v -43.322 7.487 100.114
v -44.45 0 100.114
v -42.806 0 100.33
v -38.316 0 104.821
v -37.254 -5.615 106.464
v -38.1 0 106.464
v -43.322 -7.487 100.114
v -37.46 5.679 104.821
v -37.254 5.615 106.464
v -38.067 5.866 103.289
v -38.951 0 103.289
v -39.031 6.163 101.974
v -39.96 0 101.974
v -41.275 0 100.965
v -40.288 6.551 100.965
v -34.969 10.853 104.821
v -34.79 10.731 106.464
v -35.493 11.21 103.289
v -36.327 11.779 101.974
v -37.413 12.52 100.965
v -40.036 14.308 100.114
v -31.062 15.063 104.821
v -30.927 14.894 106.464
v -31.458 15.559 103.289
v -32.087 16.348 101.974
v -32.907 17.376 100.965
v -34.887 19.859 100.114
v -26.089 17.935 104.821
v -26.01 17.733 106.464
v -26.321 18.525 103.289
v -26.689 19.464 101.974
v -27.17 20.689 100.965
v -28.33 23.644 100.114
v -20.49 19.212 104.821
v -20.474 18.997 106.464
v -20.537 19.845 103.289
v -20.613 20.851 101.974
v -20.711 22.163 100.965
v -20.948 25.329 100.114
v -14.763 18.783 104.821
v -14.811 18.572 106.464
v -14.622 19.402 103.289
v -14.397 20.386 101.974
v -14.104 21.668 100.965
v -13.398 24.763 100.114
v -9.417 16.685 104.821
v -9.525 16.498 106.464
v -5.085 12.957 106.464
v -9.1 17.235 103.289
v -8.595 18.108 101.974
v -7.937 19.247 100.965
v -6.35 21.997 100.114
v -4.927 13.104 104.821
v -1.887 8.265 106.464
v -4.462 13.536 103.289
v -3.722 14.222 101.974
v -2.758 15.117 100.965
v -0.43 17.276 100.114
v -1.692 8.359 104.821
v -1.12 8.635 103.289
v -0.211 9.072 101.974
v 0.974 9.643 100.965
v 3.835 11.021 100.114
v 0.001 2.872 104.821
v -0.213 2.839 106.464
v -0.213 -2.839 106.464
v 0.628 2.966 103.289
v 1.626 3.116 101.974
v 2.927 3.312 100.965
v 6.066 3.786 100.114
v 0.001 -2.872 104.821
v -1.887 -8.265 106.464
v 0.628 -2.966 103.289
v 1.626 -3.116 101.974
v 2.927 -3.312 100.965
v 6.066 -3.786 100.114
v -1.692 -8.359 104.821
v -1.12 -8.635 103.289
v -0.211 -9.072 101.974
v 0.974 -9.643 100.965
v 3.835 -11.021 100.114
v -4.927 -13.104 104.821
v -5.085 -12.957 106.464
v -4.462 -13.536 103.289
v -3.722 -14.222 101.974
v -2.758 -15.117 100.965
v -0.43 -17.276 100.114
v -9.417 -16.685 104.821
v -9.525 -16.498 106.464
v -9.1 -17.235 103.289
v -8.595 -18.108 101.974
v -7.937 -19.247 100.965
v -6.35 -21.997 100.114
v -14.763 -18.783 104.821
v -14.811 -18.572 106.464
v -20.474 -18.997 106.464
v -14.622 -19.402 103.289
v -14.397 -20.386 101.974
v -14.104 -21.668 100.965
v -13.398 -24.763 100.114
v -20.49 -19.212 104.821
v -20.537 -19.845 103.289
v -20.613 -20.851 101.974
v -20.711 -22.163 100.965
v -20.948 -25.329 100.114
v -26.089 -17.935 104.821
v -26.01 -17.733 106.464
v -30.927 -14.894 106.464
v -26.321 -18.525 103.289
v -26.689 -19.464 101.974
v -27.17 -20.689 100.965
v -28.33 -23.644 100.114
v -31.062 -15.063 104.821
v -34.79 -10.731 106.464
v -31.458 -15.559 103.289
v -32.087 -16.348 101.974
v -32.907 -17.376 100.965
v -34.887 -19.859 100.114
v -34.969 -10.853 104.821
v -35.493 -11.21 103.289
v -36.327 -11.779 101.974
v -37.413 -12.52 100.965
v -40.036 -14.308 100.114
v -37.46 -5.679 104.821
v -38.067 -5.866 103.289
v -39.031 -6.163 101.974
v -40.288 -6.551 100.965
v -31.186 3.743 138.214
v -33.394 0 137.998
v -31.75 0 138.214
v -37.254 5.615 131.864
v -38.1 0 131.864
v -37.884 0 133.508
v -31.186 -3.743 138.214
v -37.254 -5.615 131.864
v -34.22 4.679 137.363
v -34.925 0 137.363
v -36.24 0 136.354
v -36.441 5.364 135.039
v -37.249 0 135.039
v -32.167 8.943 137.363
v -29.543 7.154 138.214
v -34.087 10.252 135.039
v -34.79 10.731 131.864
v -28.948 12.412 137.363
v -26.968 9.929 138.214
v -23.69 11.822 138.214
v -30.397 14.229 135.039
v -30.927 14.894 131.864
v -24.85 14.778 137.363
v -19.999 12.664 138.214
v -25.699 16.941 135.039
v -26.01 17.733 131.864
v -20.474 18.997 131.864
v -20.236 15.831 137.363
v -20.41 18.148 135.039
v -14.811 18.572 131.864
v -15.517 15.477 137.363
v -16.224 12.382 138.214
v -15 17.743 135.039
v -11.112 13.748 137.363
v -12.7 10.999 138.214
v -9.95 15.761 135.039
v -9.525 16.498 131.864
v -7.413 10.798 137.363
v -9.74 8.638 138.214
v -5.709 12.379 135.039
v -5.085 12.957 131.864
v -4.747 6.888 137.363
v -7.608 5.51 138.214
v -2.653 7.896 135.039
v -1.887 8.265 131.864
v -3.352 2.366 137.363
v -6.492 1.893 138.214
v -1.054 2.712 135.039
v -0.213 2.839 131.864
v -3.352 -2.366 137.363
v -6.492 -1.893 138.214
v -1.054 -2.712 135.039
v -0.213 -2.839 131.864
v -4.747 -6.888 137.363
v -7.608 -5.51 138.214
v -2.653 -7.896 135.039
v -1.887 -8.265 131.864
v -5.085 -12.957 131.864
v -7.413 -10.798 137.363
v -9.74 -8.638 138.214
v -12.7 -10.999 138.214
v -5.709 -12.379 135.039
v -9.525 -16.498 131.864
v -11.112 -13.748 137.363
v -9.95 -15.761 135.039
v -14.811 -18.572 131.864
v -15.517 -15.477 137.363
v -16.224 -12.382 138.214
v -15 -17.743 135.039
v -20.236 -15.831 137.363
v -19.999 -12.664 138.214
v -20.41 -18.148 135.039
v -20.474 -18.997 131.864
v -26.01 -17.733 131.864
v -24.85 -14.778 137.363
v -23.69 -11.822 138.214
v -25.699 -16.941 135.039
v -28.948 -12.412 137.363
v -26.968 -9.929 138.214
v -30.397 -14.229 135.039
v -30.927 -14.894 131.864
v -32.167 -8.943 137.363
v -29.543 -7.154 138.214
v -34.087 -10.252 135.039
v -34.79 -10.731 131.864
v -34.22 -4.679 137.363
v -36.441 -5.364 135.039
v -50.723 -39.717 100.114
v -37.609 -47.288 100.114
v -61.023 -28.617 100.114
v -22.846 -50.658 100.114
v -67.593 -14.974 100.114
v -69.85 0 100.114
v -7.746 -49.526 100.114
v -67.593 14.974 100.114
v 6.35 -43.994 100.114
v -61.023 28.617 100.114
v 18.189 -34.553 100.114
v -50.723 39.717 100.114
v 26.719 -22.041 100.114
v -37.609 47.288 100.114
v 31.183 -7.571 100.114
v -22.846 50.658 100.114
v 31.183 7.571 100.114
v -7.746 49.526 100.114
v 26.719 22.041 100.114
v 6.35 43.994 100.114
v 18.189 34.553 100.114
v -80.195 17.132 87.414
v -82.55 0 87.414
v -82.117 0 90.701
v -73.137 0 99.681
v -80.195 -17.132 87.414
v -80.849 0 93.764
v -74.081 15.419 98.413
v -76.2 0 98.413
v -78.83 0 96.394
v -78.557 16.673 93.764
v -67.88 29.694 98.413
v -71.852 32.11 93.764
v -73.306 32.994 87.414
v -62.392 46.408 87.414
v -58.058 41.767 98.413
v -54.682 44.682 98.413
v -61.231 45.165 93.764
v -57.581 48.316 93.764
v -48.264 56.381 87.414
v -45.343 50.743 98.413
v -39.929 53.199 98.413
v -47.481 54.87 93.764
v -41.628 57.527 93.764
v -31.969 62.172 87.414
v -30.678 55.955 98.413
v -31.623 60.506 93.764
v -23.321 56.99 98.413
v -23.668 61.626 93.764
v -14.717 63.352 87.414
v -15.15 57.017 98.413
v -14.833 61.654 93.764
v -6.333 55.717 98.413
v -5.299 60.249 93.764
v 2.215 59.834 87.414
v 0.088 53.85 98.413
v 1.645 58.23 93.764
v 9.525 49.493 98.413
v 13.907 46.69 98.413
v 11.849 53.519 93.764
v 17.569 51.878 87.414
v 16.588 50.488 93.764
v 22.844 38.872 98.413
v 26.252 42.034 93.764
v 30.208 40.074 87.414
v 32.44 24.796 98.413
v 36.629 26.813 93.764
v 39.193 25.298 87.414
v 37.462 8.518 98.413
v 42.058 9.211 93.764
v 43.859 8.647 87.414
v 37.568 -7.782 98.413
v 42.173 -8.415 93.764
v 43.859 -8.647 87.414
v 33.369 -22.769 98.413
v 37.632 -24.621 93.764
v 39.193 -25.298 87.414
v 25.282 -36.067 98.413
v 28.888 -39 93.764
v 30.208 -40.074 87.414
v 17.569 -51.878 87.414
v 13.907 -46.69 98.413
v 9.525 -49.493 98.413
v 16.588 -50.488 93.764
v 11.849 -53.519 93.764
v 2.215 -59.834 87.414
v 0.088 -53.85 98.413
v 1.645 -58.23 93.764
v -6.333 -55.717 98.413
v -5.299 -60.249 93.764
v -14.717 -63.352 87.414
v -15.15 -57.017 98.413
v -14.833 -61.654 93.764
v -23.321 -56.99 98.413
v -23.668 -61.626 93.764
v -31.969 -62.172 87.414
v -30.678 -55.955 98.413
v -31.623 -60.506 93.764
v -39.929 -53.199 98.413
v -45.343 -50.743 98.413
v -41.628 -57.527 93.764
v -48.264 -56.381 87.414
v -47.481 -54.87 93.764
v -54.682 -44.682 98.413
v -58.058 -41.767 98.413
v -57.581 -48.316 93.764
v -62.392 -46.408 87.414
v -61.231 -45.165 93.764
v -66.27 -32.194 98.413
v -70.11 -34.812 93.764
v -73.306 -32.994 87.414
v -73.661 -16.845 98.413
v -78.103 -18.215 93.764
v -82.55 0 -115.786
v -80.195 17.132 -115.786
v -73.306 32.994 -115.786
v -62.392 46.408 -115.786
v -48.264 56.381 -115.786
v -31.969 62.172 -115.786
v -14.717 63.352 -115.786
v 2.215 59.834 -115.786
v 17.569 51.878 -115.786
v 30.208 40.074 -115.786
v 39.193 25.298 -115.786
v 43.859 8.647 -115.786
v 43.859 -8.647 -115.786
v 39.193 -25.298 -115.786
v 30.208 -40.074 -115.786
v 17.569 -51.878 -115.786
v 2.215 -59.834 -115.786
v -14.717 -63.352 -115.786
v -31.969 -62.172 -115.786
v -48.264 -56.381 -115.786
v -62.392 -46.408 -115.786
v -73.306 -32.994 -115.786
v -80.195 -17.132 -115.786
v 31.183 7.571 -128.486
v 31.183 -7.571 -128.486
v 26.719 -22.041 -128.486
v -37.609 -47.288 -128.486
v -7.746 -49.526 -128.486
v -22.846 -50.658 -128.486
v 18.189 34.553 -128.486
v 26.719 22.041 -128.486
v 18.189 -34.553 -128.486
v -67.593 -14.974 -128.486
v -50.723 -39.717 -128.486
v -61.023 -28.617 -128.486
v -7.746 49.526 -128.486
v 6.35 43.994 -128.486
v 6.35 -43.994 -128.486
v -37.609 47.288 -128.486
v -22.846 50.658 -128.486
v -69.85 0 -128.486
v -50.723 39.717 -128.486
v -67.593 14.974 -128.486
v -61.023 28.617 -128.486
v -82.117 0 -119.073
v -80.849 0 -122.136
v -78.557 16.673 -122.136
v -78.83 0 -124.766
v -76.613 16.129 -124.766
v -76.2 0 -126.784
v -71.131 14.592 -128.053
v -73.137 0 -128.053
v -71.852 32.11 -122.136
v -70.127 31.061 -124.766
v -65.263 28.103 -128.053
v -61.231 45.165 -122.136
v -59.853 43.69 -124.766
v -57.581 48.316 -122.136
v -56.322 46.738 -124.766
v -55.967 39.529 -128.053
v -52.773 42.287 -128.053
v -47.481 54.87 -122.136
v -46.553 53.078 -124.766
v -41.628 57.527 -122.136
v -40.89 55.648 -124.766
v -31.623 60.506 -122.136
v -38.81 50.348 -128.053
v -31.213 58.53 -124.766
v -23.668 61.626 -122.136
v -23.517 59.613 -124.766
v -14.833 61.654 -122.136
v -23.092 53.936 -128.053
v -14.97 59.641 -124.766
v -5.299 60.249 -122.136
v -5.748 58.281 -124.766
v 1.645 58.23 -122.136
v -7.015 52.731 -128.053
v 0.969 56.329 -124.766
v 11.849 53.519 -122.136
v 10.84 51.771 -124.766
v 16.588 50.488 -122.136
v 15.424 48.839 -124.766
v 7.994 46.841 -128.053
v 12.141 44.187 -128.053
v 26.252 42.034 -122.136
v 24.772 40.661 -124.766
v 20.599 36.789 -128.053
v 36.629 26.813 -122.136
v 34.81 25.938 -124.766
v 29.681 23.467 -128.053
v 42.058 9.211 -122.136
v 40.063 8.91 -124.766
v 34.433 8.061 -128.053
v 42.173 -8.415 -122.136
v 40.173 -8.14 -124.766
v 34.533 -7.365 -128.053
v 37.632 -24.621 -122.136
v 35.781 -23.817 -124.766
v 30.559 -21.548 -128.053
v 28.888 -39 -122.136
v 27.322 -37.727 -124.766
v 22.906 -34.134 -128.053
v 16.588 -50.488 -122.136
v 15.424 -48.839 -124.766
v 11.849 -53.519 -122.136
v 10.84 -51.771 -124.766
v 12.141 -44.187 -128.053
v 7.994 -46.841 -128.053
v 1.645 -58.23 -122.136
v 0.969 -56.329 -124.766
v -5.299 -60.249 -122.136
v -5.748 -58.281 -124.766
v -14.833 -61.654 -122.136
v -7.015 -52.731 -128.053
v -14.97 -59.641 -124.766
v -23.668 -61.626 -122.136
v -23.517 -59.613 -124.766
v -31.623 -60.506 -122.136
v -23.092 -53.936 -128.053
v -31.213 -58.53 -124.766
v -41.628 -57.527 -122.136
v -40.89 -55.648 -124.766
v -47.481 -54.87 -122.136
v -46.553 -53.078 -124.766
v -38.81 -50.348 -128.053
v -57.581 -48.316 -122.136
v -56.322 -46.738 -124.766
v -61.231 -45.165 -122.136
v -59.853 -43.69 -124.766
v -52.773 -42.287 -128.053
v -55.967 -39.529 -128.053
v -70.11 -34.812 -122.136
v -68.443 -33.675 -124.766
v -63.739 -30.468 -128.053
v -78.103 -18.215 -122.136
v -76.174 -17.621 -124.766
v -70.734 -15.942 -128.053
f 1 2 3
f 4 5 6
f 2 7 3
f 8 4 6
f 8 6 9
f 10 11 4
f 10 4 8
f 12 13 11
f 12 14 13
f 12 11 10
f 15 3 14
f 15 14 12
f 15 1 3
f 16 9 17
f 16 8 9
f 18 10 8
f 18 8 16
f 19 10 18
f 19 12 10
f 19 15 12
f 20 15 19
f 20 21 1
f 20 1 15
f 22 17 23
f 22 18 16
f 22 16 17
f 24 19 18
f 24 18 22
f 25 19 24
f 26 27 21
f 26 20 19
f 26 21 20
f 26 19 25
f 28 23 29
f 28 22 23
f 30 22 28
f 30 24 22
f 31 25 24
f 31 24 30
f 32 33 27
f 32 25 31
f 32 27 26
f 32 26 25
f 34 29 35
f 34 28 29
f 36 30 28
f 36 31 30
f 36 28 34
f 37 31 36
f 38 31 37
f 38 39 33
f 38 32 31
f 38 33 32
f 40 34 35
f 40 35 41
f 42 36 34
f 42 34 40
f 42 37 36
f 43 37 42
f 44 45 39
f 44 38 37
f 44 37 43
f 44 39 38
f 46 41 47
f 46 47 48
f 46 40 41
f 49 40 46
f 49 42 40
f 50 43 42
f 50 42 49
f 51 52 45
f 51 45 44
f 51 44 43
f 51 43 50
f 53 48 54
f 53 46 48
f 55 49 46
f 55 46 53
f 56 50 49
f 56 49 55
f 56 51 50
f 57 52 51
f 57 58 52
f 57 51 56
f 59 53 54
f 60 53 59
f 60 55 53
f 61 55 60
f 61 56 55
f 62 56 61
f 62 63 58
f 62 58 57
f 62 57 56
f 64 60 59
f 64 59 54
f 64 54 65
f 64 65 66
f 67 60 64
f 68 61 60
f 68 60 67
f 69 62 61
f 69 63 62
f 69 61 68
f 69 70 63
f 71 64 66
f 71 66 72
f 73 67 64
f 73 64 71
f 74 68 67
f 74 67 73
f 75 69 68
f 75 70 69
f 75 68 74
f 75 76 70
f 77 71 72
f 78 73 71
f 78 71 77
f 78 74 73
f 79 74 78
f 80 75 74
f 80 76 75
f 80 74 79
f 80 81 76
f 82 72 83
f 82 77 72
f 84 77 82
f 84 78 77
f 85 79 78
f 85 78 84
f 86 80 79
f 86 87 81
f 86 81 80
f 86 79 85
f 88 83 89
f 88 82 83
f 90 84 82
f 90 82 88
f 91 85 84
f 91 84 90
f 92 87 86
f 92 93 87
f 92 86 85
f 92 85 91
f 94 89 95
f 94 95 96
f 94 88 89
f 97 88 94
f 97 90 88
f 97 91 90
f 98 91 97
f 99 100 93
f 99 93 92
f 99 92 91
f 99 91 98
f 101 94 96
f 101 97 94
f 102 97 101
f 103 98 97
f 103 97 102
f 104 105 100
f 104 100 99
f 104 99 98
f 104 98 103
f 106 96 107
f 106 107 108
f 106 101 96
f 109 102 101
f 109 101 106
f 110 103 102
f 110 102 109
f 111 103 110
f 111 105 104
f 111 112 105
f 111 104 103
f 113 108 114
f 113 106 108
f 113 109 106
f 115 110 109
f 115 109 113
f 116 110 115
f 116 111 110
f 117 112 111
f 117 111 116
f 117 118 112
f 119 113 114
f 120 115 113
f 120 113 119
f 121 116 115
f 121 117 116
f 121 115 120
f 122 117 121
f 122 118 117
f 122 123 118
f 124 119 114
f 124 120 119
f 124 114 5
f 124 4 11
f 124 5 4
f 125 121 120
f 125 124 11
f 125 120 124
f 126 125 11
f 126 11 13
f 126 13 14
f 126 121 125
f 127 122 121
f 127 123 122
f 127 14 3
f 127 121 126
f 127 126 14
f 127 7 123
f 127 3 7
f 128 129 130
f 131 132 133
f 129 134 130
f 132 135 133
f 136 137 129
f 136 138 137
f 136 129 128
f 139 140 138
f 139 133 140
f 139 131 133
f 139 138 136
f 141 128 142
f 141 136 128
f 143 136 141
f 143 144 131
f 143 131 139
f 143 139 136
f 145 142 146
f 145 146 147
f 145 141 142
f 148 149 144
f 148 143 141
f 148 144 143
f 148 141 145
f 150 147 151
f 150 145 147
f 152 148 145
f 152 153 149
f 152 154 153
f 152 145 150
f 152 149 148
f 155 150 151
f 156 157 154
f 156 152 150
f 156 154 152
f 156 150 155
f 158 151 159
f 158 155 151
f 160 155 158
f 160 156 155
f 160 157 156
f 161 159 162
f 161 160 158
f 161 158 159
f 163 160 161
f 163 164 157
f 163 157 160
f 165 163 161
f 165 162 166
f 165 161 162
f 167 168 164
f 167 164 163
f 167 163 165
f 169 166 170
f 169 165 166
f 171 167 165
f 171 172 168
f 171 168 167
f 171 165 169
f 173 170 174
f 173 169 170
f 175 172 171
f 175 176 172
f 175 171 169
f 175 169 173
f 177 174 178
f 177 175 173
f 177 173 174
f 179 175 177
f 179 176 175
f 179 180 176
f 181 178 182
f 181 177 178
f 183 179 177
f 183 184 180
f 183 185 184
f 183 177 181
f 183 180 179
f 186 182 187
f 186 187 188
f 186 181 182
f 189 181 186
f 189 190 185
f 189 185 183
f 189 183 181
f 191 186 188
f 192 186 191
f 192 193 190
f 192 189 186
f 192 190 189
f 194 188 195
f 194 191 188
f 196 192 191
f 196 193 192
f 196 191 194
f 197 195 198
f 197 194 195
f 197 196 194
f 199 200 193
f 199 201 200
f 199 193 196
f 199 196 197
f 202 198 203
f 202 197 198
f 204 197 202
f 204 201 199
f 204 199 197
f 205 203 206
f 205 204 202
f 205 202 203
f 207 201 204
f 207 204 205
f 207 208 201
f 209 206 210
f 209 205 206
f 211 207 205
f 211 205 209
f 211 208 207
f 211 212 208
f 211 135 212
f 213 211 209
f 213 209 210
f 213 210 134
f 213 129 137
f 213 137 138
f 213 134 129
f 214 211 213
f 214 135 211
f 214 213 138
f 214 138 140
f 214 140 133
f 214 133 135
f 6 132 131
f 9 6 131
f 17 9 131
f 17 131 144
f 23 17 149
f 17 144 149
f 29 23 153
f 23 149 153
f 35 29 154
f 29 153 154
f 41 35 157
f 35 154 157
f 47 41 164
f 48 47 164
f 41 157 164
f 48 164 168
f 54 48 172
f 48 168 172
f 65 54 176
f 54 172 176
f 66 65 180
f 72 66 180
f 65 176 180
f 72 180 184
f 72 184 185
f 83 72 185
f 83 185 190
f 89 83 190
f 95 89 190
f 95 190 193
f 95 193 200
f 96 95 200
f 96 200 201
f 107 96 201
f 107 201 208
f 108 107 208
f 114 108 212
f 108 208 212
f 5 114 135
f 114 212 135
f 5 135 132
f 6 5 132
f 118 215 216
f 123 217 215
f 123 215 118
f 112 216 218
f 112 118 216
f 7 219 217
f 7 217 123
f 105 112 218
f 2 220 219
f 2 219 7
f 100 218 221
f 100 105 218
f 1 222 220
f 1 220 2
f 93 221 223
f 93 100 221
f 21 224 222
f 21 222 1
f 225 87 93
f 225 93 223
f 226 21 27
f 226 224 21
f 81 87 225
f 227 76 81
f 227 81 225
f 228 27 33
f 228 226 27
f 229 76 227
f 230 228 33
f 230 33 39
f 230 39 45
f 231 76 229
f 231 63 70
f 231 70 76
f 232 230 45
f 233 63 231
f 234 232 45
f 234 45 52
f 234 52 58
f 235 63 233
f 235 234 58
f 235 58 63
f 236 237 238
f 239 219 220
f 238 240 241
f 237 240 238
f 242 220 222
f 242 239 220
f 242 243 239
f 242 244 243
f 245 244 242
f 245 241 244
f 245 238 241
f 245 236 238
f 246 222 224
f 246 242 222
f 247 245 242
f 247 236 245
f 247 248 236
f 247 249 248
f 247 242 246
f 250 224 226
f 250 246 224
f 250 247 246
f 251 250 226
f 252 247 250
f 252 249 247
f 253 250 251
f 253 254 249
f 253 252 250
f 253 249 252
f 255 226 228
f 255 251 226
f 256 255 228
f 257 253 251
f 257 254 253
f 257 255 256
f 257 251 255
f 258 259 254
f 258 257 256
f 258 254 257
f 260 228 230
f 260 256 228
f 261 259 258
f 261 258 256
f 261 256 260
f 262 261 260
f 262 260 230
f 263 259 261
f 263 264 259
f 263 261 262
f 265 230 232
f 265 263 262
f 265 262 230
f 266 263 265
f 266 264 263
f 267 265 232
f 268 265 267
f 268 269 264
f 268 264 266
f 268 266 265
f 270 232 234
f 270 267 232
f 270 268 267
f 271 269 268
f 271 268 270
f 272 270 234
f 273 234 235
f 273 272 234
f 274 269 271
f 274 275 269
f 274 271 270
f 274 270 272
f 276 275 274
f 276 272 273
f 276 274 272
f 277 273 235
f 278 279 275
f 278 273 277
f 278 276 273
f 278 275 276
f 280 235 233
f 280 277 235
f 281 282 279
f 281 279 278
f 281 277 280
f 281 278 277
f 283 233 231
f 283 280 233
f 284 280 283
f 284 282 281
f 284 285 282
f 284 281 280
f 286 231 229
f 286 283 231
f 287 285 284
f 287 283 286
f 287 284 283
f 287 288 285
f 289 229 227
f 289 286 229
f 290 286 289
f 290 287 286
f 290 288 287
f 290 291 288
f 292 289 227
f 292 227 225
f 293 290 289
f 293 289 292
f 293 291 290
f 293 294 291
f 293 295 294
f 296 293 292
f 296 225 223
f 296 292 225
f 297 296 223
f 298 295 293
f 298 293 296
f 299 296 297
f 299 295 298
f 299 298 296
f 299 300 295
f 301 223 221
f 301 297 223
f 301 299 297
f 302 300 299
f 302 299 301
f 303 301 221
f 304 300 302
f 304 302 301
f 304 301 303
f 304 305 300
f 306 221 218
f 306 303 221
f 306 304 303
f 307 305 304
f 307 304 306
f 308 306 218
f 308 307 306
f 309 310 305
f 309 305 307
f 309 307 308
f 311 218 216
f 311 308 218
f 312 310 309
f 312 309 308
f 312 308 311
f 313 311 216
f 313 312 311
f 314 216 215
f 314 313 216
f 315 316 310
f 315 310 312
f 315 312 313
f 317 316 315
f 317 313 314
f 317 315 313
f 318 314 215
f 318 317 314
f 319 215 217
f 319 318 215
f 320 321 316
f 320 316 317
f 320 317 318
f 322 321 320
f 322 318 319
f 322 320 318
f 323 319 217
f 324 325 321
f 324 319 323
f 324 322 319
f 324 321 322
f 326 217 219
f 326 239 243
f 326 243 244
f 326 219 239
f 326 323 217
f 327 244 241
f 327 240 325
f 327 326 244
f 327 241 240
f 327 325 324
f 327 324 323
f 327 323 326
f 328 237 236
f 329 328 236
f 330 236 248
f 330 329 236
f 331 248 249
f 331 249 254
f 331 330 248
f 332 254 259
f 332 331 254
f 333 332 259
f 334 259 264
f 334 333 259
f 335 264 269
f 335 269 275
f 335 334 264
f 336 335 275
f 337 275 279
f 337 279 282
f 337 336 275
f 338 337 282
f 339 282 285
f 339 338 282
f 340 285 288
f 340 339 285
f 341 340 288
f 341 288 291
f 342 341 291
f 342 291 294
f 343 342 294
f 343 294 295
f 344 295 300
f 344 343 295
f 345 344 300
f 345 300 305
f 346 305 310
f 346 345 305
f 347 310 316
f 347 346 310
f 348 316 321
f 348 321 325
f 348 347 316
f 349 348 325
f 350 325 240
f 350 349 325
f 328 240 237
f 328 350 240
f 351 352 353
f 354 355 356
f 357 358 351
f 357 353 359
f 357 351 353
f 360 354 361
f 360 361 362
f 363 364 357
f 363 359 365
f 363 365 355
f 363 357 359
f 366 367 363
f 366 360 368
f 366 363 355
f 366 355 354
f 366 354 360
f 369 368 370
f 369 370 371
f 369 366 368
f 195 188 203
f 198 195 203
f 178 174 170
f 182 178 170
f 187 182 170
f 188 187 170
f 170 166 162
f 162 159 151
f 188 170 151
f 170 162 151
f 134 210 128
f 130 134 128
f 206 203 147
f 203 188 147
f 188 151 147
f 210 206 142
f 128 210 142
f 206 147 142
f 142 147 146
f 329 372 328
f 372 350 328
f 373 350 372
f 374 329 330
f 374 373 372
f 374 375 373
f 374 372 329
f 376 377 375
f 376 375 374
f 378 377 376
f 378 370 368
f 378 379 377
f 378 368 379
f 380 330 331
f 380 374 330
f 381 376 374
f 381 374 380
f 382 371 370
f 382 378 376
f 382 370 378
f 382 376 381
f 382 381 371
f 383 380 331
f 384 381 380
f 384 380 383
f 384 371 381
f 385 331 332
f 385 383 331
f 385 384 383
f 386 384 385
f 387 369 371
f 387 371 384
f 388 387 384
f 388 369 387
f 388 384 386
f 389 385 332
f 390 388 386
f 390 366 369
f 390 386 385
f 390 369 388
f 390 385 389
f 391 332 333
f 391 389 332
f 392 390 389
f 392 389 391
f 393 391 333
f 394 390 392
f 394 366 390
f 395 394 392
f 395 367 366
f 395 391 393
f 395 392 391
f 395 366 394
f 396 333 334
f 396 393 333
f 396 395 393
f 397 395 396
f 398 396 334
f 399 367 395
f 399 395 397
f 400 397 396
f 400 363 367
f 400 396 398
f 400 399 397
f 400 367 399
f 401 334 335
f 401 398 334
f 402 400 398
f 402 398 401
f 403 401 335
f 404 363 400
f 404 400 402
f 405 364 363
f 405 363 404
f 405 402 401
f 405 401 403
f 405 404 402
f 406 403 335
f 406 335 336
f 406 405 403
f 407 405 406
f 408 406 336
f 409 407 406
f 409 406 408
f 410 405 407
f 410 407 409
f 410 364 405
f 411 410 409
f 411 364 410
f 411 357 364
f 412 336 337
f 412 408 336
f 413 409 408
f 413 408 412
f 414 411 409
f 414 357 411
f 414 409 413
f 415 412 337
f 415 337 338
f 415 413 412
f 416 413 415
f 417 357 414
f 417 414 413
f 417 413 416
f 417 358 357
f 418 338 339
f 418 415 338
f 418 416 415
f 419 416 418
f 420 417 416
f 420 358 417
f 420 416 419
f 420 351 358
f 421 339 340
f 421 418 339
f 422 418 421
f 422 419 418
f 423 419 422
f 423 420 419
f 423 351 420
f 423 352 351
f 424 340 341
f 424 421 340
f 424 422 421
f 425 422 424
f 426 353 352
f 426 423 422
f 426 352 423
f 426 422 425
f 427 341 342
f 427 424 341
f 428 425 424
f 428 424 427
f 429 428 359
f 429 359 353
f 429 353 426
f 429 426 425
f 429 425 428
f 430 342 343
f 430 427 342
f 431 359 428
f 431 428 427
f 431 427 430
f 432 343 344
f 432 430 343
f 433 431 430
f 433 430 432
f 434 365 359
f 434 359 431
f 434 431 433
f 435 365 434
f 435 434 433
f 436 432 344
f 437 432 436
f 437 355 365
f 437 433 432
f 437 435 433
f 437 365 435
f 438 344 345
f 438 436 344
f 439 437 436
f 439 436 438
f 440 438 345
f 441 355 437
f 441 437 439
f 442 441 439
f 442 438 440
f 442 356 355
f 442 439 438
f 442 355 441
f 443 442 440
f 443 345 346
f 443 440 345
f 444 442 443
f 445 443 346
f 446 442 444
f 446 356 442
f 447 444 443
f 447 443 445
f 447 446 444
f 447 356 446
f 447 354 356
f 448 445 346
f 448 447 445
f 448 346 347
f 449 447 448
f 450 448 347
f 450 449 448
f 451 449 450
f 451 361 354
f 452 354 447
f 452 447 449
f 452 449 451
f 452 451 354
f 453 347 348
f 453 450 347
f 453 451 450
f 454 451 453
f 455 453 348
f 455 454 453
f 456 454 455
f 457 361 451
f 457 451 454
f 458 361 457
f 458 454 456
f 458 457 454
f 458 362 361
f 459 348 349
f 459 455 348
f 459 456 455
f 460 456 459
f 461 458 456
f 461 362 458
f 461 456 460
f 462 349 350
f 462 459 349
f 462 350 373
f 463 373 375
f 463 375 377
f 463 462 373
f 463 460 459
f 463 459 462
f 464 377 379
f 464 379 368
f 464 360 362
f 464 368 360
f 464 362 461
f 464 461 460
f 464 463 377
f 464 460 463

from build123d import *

# Parameters (mm, degrees)
F0_W = 19.05
F0_H = 38.1
F2_R = 6.35


with BuildPart() as f1:
    # F0 (on Front) → F1 (revolve)
    with BuildSketch(Plane.XZ):
        with BuildLine():
            Line((-38.1, 100.1140274882), (-69.85, 100.1140274882))
            ThreePointArc((-69.85, 100.1140274882), (-78.8302561211, 96.3942836093), (-82.55, 87.4140274882))
            Line((-82.55, 87.4140274882), (-82.55, -115.7859725118))
            ThreePointArc((-82.55, -115.7859725118), (-78.8302561211, -124.7662286328), (-69.85, -128.4859725118))
            Line((-69.85, -128.4859725118), (-19.05, -128.4859725118))
            Line((-19.05, -128.4859725118), (-19.05, 100.1140274882))
            Line((-19.05, 100.1140274882), (-38.1, 100.1140274882))
        make_face()
        with Locations((-28.575, 119.1640274882)):
            Rectangle(F0_W, F0_H)
    revolve(axis=Axis((-19.05, 0, 11.2281292677), (0, 0, -1)))

    # F2
    f2_edges = [f1.edges().sort_by_distance(p)[0] for p in [
        (0, 0, 100.114027),
        (0, 0, 138.214027),
    ]]
    fillet(f2_edges, radius=F2_R)


solid = f1.part
